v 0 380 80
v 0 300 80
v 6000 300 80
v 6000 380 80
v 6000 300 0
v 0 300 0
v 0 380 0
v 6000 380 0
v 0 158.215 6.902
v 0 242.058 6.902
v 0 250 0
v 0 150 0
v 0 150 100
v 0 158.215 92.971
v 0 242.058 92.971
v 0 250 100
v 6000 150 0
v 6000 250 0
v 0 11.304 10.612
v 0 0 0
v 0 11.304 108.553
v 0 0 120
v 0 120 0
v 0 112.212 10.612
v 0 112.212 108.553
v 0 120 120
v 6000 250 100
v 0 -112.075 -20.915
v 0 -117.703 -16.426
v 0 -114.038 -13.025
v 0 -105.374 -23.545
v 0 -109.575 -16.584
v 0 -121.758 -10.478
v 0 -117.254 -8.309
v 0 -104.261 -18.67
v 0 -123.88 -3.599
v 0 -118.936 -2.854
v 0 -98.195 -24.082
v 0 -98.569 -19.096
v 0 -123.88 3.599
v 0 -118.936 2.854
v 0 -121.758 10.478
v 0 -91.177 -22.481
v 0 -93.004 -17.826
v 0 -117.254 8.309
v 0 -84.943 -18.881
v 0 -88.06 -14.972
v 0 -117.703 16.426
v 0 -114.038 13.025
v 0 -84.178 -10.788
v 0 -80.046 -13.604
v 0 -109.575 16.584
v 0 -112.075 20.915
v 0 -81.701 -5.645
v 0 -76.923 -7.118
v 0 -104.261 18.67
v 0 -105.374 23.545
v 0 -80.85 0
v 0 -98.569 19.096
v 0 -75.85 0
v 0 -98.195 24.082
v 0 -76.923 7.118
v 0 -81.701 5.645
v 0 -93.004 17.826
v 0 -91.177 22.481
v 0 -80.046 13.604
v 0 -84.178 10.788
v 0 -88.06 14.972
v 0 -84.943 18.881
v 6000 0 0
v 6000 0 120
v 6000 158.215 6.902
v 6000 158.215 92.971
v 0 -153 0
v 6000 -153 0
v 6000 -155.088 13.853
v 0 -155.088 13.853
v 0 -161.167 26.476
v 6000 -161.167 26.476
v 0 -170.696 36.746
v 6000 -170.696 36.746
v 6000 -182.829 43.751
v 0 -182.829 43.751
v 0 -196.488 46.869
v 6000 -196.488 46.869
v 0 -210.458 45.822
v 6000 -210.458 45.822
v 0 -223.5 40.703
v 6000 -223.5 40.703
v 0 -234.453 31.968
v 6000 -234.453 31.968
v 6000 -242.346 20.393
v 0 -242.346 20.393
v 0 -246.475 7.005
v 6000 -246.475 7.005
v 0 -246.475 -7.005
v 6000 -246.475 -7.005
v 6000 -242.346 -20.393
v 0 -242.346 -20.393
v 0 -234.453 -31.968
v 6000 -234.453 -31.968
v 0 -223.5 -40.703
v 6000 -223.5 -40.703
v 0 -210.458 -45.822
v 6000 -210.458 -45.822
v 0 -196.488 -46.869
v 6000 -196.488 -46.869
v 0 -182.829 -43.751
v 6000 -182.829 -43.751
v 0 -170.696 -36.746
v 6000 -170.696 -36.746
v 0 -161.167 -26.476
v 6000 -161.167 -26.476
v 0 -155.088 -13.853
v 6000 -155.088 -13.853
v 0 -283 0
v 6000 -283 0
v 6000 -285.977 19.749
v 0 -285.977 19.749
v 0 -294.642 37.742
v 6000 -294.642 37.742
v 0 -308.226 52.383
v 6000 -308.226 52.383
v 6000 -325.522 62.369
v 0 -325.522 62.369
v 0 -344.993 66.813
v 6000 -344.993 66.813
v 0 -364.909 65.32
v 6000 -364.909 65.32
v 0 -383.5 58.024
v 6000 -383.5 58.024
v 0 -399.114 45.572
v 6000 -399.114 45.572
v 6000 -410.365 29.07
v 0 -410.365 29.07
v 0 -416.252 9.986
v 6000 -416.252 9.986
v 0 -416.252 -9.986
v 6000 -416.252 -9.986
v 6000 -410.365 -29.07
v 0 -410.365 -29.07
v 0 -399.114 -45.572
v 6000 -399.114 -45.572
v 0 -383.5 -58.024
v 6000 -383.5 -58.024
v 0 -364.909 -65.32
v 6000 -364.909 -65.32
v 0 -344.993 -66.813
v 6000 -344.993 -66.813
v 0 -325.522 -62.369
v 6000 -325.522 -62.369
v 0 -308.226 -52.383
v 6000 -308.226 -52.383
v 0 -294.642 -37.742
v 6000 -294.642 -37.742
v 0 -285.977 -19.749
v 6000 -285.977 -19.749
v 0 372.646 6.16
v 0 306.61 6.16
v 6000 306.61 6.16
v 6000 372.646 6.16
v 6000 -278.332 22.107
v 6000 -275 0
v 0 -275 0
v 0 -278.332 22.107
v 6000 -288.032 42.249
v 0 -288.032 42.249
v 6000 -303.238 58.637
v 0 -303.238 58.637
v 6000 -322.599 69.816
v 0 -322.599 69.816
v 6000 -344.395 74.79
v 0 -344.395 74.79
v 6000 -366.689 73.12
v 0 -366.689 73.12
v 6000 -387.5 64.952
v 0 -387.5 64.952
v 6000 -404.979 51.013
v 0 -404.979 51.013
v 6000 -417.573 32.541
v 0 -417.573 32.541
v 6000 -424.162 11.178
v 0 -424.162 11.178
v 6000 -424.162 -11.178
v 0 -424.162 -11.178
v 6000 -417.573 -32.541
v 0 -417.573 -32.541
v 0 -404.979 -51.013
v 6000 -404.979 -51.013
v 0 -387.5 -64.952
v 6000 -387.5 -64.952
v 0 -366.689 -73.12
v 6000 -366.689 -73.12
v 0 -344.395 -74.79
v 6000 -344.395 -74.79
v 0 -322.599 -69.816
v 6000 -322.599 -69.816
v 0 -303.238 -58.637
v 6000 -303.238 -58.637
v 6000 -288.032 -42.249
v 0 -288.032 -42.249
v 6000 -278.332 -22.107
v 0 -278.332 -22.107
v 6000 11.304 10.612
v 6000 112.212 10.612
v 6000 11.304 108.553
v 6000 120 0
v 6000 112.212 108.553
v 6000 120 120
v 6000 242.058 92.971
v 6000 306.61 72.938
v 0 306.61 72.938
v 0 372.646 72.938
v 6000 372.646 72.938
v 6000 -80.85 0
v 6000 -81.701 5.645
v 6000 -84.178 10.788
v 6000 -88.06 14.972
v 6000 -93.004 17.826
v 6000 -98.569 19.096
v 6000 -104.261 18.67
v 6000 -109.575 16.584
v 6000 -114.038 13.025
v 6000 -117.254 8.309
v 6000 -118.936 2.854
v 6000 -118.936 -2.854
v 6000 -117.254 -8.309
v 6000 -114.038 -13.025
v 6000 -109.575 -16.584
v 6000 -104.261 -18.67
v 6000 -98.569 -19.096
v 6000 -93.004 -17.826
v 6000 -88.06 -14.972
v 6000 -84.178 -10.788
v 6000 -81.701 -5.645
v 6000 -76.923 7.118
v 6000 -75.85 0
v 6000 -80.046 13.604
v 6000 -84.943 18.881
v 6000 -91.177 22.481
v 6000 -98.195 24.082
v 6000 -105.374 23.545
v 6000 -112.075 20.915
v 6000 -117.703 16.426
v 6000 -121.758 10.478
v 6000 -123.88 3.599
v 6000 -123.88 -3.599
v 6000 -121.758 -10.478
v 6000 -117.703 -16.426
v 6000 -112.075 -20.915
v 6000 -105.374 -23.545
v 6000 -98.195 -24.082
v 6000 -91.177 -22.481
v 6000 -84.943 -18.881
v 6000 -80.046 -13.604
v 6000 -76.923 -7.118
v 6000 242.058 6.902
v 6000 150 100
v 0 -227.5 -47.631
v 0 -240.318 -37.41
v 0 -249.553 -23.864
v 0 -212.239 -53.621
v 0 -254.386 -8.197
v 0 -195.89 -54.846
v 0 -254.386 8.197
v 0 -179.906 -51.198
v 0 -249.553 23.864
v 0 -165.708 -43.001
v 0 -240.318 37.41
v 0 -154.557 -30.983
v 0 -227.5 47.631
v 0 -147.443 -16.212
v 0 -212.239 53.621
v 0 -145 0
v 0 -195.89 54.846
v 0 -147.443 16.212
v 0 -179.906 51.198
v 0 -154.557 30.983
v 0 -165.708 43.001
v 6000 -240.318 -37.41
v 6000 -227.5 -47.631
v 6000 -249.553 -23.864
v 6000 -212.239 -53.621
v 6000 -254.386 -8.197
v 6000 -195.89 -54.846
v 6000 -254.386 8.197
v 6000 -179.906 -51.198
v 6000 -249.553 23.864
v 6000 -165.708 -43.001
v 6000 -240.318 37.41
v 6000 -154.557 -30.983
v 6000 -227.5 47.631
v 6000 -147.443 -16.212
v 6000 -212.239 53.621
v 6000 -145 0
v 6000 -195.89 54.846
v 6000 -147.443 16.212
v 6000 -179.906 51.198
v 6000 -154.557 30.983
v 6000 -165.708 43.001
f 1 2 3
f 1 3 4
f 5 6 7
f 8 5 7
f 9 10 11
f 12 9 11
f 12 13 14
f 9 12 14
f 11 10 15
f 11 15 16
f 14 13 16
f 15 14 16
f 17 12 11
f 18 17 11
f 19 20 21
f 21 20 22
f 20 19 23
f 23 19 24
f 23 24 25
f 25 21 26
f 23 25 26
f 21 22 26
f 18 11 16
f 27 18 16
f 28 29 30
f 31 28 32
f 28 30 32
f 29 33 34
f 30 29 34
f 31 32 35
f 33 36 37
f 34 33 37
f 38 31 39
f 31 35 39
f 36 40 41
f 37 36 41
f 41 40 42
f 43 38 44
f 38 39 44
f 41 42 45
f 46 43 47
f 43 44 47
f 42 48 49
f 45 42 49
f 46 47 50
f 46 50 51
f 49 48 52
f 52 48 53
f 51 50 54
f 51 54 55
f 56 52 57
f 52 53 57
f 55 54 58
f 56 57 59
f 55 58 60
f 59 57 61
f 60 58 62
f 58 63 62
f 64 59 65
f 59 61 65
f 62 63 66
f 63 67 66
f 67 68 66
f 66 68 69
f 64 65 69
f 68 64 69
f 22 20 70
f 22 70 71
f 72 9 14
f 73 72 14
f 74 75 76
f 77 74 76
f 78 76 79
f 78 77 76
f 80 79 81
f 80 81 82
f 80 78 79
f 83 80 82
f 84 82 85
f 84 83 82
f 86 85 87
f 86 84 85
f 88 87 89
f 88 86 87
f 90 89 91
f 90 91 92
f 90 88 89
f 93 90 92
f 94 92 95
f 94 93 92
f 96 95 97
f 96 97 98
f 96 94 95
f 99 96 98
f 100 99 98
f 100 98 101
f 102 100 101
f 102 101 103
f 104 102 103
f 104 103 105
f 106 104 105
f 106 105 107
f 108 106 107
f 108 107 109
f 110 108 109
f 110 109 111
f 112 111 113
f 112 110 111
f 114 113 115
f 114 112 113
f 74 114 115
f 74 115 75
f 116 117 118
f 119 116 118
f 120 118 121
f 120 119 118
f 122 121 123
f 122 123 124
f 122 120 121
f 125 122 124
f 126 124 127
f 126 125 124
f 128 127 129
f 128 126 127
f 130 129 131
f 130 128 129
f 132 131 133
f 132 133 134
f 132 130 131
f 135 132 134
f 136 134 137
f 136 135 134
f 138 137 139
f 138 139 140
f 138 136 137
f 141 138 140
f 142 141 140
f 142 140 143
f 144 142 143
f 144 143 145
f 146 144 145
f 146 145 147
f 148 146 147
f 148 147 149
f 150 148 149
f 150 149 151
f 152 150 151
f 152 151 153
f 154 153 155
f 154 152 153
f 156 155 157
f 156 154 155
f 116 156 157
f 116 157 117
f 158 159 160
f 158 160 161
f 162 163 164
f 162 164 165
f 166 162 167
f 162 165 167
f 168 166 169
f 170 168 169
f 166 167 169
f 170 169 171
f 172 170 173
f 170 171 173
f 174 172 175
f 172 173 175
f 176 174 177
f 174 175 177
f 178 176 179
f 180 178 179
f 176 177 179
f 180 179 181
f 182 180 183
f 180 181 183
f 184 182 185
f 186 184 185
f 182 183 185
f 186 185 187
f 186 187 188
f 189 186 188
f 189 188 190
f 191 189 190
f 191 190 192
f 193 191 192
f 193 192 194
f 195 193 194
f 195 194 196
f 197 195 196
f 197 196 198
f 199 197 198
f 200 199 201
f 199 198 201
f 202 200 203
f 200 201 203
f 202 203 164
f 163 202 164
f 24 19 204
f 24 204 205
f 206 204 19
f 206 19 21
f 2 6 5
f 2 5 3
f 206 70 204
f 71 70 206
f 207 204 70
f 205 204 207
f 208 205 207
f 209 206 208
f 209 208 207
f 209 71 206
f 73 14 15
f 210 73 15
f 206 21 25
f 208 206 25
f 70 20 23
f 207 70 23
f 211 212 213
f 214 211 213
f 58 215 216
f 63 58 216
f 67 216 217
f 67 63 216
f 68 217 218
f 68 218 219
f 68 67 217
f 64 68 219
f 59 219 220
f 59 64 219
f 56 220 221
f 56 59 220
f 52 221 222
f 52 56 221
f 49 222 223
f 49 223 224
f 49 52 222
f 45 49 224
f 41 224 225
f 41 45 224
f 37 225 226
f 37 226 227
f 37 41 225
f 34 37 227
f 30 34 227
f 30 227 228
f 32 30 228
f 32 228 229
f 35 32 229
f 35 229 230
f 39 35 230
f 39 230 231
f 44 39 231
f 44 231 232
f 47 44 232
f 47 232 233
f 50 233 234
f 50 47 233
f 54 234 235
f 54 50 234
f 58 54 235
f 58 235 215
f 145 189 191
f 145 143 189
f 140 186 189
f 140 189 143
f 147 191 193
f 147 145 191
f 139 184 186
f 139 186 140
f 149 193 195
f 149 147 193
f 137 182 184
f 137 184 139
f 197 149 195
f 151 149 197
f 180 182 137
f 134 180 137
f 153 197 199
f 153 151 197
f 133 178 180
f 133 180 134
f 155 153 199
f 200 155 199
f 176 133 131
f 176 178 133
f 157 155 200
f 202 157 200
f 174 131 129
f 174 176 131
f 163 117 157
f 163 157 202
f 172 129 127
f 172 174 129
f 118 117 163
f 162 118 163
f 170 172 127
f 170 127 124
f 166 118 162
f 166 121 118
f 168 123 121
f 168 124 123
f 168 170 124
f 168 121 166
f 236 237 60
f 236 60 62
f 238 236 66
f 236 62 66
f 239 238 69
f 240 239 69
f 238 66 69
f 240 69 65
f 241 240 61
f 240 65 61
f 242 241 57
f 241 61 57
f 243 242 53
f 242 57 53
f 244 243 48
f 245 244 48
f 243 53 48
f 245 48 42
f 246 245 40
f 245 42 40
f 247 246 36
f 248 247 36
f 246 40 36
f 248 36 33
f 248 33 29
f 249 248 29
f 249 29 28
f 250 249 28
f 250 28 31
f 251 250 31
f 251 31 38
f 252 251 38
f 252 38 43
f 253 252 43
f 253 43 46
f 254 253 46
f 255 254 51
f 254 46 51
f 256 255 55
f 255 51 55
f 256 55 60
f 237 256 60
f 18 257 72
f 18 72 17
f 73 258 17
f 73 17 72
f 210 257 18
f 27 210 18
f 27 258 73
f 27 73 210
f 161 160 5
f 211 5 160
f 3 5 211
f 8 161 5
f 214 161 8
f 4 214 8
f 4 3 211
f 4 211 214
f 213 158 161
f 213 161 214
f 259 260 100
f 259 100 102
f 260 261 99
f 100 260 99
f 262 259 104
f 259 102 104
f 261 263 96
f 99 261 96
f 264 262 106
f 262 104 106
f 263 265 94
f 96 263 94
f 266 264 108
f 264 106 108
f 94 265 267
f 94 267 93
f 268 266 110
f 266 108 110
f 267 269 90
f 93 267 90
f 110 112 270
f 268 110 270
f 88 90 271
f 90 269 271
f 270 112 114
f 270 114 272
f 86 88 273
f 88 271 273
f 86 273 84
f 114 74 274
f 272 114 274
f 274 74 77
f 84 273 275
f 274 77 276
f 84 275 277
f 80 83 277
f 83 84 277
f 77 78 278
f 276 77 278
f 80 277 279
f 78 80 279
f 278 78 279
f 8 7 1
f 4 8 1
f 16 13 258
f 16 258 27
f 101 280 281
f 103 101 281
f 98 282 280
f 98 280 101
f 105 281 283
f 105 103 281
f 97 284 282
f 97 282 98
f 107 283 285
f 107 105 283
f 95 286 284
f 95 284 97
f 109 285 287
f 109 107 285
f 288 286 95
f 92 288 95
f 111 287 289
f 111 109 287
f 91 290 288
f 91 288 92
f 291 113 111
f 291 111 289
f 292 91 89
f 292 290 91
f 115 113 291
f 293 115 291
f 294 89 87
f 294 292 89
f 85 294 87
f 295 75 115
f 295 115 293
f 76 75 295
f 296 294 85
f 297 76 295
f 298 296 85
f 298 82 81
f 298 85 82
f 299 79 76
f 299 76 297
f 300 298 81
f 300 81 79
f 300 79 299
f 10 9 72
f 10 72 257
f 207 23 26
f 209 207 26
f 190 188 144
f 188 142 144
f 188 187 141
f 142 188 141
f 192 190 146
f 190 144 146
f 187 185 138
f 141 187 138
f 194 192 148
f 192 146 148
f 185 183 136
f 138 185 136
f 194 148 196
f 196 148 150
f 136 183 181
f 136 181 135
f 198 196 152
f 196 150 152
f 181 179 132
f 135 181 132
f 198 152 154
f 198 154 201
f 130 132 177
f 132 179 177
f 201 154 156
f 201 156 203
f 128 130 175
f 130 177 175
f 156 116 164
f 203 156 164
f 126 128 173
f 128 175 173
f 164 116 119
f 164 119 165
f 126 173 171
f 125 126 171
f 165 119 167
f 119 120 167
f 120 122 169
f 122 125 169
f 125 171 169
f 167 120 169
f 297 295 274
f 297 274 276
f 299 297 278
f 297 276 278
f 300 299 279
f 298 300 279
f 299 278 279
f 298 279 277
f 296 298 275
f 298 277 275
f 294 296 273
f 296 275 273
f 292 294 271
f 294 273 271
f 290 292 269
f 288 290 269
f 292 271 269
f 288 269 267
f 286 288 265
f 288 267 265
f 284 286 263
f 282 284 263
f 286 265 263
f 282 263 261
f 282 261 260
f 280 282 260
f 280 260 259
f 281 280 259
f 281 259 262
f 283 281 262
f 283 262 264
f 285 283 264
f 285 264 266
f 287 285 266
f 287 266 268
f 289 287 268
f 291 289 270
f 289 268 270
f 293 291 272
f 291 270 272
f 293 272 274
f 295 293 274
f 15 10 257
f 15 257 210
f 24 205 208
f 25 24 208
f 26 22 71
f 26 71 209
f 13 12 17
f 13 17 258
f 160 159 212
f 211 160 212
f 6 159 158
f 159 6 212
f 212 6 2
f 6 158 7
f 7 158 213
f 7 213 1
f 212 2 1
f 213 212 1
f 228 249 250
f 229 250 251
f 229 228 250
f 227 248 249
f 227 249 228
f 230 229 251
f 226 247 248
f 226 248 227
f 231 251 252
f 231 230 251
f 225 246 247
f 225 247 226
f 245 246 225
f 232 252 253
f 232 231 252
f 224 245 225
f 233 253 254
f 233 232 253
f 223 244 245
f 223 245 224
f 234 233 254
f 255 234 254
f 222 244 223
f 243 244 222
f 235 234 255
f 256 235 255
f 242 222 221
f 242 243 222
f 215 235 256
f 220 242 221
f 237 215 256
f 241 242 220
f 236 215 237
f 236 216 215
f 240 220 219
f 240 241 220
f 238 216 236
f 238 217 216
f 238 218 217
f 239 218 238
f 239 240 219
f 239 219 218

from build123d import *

# Parameters (mm, degrees)
F0_R     = 55
F0_R_2   = 47
F0_R_3   = 24.15
F0_R_4   = 19.15
F0_W     = 120
F0_H     = 120
F0_W_2   = 100.908783
F0_H_2   = 97.940877
F0_W_3   = 100
F0_H_3   = 100
F0_W_4   = 83.84332
F0_H_4   = 86.069254
F0_W_5   = 80
F0_H_5   = 80
F0_W_6   = 66.035896
F0_H_6   = 66.777872
F0_R_5   = 75
F0_R_6   = 67
F1_DEPTH = 6000


with BuildPart() as f1:
    # F0 (on Right) → F1 (new body)
    with BuildSketch(Plane.YZ):
        with Locations((-200, 0)):
            Circle(F0_R)
        with Locations((-200, 0)):
            Circle(F0_R_2, mode=Mode.SUBTRACT)
        with Locations((-100, 0)):
            Circle(F0_R_3)
        with Locations((-100, 0)):
            Circle(F0_R_4, mode=Mode.SUBTRACT)
        with Locations((60, 60)):
            Rectangle(F0_W, F0_H)
        with Locations((61.758021, 59.582129)):
            Rectangle(F0_W_2, F0_H_2, mode=Mode.SUBTRACT)
        with Locations((200, 50)):
            Rectangle(F0_W_3, F0_H_3)
        with Locations((200.136602, 49.936437)):
            Rectangle(F0_W_4, F0_H_4, mode=Mode.SUBTRACT)
        with Locations((340, 40)):
            Rectangle(F0_W_5, F0_H_5)
        with Locations((339.628145, 39.548769)):
            Rectangle(F0_W_6, F0_H_6, mode=Mode.SUBTRACT)
        with Locations((-350, 0)):
            Circle(F0_R_5)
        with Locations((-350, 0)):
            Circle(F0_R_6, mode=Mode.SUBTRACT)
    extrude(amount=F1_DEPTH)


solid = f1.part
